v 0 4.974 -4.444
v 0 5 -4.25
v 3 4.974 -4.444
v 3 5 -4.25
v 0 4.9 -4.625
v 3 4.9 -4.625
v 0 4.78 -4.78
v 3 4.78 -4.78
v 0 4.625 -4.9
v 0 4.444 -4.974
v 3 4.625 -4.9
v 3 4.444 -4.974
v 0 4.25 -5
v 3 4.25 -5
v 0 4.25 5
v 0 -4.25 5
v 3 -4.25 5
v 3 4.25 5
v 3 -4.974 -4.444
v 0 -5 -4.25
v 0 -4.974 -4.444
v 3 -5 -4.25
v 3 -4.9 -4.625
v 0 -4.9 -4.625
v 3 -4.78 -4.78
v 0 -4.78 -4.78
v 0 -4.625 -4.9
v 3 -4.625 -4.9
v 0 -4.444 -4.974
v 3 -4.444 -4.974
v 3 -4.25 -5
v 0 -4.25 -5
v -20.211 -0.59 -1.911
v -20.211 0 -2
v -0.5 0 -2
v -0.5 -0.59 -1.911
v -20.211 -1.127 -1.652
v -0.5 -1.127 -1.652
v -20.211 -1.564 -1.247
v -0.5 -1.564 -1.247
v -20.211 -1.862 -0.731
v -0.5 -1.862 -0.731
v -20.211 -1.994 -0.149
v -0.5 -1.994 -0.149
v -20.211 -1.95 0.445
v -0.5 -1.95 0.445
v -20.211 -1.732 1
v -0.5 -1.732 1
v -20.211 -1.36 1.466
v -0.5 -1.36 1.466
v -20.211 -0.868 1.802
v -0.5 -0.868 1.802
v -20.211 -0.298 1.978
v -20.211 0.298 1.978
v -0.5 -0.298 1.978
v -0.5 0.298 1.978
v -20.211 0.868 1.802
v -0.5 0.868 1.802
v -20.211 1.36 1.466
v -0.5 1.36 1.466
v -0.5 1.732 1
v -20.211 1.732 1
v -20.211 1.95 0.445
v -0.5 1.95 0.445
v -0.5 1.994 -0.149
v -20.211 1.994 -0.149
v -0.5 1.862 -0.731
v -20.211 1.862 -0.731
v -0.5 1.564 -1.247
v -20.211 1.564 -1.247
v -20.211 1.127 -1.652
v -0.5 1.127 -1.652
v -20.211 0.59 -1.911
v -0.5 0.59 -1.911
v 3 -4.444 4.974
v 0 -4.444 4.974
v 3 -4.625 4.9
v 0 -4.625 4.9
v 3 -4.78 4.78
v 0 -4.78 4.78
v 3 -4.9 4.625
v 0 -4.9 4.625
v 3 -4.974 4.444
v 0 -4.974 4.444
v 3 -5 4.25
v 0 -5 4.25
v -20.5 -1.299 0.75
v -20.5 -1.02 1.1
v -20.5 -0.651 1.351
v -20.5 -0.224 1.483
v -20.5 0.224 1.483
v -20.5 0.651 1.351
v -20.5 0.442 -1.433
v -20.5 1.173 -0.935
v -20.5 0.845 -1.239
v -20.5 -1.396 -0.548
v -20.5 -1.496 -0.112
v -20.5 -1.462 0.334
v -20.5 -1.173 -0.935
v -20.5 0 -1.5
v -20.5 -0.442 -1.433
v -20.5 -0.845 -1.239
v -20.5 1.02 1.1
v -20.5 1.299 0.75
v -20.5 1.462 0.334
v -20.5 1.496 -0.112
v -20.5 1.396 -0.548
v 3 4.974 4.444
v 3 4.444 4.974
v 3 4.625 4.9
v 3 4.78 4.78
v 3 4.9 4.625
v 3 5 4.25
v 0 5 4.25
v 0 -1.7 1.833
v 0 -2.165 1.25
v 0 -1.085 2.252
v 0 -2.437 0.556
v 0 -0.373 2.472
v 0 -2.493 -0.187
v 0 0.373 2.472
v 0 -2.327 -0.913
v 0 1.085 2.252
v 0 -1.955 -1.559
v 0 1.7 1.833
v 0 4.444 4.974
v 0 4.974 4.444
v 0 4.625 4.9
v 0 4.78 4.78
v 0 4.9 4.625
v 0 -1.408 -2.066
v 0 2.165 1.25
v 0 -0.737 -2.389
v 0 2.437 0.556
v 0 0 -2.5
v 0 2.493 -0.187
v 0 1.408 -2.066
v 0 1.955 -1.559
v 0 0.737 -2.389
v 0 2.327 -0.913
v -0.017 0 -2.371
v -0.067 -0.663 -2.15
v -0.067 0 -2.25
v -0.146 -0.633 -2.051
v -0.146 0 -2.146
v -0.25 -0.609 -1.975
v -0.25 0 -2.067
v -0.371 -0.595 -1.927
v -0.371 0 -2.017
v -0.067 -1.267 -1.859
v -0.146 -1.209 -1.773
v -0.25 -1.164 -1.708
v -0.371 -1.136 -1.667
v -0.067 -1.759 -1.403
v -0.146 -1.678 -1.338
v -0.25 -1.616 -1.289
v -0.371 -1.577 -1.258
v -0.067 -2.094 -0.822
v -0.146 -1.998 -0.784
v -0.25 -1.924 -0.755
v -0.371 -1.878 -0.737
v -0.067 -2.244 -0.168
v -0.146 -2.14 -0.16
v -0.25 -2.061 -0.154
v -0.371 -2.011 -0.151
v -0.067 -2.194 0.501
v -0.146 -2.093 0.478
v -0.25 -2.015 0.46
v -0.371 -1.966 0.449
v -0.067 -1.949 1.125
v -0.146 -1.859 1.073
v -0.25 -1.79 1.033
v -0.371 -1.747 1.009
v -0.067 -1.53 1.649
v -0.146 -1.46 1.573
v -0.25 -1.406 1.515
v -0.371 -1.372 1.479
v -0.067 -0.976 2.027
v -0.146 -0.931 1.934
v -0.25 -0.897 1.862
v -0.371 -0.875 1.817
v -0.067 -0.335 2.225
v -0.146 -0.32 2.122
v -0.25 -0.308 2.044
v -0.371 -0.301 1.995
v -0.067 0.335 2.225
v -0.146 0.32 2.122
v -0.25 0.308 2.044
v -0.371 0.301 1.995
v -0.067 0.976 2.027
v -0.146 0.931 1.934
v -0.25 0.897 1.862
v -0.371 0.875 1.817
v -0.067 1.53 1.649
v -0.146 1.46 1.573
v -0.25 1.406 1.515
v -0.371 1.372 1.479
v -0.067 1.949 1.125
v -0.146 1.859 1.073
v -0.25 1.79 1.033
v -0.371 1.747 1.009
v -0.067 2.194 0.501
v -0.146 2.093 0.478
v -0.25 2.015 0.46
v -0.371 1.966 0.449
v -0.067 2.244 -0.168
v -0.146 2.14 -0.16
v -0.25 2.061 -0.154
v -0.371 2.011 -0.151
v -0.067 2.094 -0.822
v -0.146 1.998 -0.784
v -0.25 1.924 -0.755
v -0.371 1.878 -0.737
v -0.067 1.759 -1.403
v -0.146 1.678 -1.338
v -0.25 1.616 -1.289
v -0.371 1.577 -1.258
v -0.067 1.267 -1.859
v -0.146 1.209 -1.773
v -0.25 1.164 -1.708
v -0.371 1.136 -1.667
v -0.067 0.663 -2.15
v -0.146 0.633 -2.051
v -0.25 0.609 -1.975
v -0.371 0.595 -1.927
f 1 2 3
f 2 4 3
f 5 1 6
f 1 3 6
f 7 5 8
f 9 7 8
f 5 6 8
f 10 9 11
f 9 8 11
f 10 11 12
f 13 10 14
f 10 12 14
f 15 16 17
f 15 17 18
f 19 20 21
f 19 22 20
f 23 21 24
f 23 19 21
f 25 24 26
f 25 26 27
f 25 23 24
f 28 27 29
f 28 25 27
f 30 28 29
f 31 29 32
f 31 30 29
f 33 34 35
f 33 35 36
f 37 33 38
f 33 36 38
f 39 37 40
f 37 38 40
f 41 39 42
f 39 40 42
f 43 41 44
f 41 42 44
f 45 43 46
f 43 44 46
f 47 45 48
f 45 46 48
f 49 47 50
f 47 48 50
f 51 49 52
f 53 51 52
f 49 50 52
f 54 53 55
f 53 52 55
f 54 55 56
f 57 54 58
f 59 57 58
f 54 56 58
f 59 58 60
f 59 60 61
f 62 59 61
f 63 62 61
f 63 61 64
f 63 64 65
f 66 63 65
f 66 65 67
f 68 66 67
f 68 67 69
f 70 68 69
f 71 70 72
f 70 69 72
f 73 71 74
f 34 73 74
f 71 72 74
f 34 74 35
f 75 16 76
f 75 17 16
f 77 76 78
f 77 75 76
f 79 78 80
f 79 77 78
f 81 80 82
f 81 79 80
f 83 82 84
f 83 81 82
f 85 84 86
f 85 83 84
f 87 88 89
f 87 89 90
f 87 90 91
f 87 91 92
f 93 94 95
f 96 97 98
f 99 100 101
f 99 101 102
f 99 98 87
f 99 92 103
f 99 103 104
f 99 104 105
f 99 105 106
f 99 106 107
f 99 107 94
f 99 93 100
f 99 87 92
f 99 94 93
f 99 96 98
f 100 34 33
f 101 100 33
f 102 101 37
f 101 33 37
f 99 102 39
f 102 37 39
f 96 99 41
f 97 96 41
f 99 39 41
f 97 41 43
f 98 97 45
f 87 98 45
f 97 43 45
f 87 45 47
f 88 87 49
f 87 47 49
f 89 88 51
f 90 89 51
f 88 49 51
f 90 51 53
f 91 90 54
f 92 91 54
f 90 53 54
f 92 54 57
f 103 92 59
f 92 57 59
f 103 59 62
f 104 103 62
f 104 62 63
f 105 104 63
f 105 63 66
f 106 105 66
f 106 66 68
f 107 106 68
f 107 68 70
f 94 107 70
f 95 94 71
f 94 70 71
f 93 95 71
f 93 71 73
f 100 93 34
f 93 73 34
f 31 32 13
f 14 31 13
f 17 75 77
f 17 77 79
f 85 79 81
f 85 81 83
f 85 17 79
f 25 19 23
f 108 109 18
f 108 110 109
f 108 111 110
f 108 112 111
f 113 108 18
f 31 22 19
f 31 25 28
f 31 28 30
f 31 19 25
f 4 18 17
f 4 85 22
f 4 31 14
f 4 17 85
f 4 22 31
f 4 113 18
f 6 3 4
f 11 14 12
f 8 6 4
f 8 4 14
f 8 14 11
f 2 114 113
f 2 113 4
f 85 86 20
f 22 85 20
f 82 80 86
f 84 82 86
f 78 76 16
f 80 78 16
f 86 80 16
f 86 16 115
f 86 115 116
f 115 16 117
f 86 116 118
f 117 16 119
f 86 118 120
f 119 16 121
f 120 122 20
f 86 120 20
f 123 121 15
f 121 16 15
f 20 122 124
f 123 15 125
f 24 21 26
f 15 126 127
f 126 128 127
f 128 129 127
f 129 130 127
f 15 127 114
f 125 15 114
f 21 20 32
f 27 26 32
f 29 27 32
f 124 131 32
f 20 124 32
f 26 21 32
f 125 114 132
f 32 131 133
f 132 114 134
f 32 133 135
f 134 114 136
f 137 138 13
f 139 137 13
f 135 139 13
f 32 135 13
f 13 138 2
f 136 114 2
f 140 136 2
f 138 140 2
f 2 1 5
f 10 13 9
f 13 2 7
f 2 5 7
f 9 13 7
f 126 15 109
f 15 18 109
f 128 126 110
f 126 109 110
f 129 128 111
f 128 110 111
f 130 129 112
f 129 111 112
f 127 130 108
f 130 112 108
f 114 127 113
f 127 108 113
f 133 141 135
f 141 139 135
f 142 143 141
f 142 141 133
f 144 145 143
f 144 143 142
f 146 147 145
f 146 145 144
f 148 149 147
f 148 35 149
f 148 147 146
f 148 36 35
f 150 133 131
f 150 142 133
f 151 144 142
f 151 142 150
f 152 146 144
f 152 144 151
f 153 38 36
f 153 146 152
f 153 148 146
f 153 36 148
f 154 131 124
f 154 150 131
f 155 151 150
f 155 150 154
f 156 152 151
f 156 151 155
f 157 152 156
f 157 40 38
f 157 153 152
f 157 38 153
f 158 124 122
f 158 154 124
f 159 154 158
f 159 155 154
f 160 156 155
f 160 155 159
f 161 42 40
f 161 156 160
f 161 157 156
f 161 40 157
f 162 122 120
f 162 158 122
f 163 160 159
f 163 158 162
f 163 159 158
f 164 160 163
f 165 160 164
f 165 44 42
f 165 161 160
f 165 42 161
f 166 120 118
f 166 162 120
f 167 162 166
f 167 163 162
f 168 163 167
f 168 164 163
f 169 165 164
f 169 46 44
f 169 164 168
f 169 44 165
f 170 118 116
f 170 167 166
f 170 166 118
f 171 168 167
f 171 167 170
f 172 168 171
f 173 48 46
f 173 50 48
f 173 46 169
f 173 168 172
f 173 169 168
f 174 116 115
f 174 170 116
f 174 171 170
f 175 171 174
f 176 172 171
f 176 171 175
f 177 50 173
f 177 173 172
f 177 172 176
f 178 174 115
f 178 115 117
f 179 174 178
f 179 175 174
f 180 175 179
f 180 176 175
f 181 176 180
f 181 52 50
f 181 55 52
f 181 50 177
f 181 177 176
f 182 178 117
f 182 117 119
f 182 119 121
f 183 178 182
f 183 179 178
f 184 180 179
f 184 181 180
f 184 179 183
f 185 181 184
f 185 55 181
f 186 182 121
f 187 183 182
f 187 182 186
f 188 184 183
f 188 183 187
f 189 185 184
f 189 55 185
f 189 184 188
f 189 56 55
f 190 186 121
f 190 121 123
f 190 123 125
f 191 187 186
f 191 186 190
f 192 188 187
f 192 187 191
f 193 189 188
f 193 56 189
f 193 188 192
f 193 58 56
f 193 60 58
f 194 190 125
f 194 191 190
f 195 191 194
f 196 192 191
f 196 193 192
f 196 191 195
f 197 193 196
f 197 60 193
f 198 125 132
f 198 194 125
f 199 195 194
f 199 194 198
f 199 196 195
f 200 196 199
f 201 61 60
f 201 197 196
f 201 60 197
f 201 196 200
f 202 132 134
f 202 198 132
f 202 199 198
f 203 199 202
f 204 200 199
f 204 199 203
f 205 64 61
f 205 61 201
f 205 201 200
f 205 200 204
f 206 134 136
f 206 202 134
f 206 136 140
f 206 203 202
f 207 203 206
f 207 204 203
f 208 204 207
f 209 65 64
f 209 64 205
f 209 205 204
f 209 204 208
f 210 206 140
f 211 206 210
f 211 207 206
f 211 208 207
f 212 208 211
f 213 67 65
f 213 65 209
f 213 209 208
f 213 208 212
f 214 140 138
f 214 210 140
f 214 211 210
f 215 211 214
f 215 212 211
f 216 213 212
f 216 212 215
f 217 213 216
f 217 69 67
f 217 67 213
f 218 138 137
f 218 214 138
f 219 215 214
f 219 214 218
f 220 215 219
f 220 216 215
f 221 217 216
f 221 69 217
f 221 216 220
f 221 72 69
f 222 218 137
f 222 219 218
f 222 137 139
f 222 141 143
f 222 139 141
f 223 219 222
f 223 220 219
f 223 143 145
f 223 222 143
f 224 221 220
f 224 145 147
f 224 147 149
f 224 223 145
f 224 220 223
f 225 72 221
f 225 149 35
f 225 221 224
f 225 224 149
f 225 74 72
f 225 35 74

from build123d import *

# Parameters (mm, degrees)
SKETCH1_W      = 10
SKETCH1_H      = 10
HEAD_DEPTH     = 3
SKETCH2_R      = 2
SHAFT_DEPTH    = 20.5
HEAD_FILLET_R  = 0.75
FILLET1_R      = 0.5
CHAMFER1_SIZE  = 0.5
CHAMFER1_SIZE2 = 0.288675135


with BuildPart() as part:
    # Sketch1 → head (new body)
    with BuildSketch(Plane(origin=(0, 0, 0), x_dir=(0, 0, -1), z_dir=(1, 0, 0))):
        Rectangle(SKETCH1_W, SKETCH1_H)
    extrude(amount=HEAD_DEPTH)

    # Sketch2 → shaft (add)
    with BuildSketch(Plane.ZY):
        with Locations(Location((0, 0, 0), (0, 0, 180))):  # turned: the seam where the file's is
            Circle(SKETCH2_R)
    extrude(amount=SHAFT_DEPTH)

    # head fillet
    head_fillet_edges = [part.edges().sort_by_distance(p)[0] for p in [
        (1.5, 5, 5),
        (1.5, 5, -5),
        (1.5, -5, -5),
        (1.5, -5, 5),
    ]]
    fillet(head_fillet_edges, radius=HEAD_FILLET_R)

    # Fillet1
    fillet1_edges = [part.edges().sort_by_distance(p)[0] for p in [
        (0, 0, 2),
    ]]
    fillet(fillet1_edges, radius=FILLET1_R)

    # Chamfer1
    chamfer1_edges = [part.edges().sort_by_distance(p)[0] for p in [
        (-20.5, 0, 2),
    ]]
    chamfer1_side = [part.faces().sort_by_distance(p)[0] for p in [
        (-20.5, 0, 0),
    ]]
    chamfer(chamfer1_edges, length=CHAMFER1_SIZE, length2=CHAMFER1_SIZE2, reference=chamfer1_side[0])


solid = part.part
